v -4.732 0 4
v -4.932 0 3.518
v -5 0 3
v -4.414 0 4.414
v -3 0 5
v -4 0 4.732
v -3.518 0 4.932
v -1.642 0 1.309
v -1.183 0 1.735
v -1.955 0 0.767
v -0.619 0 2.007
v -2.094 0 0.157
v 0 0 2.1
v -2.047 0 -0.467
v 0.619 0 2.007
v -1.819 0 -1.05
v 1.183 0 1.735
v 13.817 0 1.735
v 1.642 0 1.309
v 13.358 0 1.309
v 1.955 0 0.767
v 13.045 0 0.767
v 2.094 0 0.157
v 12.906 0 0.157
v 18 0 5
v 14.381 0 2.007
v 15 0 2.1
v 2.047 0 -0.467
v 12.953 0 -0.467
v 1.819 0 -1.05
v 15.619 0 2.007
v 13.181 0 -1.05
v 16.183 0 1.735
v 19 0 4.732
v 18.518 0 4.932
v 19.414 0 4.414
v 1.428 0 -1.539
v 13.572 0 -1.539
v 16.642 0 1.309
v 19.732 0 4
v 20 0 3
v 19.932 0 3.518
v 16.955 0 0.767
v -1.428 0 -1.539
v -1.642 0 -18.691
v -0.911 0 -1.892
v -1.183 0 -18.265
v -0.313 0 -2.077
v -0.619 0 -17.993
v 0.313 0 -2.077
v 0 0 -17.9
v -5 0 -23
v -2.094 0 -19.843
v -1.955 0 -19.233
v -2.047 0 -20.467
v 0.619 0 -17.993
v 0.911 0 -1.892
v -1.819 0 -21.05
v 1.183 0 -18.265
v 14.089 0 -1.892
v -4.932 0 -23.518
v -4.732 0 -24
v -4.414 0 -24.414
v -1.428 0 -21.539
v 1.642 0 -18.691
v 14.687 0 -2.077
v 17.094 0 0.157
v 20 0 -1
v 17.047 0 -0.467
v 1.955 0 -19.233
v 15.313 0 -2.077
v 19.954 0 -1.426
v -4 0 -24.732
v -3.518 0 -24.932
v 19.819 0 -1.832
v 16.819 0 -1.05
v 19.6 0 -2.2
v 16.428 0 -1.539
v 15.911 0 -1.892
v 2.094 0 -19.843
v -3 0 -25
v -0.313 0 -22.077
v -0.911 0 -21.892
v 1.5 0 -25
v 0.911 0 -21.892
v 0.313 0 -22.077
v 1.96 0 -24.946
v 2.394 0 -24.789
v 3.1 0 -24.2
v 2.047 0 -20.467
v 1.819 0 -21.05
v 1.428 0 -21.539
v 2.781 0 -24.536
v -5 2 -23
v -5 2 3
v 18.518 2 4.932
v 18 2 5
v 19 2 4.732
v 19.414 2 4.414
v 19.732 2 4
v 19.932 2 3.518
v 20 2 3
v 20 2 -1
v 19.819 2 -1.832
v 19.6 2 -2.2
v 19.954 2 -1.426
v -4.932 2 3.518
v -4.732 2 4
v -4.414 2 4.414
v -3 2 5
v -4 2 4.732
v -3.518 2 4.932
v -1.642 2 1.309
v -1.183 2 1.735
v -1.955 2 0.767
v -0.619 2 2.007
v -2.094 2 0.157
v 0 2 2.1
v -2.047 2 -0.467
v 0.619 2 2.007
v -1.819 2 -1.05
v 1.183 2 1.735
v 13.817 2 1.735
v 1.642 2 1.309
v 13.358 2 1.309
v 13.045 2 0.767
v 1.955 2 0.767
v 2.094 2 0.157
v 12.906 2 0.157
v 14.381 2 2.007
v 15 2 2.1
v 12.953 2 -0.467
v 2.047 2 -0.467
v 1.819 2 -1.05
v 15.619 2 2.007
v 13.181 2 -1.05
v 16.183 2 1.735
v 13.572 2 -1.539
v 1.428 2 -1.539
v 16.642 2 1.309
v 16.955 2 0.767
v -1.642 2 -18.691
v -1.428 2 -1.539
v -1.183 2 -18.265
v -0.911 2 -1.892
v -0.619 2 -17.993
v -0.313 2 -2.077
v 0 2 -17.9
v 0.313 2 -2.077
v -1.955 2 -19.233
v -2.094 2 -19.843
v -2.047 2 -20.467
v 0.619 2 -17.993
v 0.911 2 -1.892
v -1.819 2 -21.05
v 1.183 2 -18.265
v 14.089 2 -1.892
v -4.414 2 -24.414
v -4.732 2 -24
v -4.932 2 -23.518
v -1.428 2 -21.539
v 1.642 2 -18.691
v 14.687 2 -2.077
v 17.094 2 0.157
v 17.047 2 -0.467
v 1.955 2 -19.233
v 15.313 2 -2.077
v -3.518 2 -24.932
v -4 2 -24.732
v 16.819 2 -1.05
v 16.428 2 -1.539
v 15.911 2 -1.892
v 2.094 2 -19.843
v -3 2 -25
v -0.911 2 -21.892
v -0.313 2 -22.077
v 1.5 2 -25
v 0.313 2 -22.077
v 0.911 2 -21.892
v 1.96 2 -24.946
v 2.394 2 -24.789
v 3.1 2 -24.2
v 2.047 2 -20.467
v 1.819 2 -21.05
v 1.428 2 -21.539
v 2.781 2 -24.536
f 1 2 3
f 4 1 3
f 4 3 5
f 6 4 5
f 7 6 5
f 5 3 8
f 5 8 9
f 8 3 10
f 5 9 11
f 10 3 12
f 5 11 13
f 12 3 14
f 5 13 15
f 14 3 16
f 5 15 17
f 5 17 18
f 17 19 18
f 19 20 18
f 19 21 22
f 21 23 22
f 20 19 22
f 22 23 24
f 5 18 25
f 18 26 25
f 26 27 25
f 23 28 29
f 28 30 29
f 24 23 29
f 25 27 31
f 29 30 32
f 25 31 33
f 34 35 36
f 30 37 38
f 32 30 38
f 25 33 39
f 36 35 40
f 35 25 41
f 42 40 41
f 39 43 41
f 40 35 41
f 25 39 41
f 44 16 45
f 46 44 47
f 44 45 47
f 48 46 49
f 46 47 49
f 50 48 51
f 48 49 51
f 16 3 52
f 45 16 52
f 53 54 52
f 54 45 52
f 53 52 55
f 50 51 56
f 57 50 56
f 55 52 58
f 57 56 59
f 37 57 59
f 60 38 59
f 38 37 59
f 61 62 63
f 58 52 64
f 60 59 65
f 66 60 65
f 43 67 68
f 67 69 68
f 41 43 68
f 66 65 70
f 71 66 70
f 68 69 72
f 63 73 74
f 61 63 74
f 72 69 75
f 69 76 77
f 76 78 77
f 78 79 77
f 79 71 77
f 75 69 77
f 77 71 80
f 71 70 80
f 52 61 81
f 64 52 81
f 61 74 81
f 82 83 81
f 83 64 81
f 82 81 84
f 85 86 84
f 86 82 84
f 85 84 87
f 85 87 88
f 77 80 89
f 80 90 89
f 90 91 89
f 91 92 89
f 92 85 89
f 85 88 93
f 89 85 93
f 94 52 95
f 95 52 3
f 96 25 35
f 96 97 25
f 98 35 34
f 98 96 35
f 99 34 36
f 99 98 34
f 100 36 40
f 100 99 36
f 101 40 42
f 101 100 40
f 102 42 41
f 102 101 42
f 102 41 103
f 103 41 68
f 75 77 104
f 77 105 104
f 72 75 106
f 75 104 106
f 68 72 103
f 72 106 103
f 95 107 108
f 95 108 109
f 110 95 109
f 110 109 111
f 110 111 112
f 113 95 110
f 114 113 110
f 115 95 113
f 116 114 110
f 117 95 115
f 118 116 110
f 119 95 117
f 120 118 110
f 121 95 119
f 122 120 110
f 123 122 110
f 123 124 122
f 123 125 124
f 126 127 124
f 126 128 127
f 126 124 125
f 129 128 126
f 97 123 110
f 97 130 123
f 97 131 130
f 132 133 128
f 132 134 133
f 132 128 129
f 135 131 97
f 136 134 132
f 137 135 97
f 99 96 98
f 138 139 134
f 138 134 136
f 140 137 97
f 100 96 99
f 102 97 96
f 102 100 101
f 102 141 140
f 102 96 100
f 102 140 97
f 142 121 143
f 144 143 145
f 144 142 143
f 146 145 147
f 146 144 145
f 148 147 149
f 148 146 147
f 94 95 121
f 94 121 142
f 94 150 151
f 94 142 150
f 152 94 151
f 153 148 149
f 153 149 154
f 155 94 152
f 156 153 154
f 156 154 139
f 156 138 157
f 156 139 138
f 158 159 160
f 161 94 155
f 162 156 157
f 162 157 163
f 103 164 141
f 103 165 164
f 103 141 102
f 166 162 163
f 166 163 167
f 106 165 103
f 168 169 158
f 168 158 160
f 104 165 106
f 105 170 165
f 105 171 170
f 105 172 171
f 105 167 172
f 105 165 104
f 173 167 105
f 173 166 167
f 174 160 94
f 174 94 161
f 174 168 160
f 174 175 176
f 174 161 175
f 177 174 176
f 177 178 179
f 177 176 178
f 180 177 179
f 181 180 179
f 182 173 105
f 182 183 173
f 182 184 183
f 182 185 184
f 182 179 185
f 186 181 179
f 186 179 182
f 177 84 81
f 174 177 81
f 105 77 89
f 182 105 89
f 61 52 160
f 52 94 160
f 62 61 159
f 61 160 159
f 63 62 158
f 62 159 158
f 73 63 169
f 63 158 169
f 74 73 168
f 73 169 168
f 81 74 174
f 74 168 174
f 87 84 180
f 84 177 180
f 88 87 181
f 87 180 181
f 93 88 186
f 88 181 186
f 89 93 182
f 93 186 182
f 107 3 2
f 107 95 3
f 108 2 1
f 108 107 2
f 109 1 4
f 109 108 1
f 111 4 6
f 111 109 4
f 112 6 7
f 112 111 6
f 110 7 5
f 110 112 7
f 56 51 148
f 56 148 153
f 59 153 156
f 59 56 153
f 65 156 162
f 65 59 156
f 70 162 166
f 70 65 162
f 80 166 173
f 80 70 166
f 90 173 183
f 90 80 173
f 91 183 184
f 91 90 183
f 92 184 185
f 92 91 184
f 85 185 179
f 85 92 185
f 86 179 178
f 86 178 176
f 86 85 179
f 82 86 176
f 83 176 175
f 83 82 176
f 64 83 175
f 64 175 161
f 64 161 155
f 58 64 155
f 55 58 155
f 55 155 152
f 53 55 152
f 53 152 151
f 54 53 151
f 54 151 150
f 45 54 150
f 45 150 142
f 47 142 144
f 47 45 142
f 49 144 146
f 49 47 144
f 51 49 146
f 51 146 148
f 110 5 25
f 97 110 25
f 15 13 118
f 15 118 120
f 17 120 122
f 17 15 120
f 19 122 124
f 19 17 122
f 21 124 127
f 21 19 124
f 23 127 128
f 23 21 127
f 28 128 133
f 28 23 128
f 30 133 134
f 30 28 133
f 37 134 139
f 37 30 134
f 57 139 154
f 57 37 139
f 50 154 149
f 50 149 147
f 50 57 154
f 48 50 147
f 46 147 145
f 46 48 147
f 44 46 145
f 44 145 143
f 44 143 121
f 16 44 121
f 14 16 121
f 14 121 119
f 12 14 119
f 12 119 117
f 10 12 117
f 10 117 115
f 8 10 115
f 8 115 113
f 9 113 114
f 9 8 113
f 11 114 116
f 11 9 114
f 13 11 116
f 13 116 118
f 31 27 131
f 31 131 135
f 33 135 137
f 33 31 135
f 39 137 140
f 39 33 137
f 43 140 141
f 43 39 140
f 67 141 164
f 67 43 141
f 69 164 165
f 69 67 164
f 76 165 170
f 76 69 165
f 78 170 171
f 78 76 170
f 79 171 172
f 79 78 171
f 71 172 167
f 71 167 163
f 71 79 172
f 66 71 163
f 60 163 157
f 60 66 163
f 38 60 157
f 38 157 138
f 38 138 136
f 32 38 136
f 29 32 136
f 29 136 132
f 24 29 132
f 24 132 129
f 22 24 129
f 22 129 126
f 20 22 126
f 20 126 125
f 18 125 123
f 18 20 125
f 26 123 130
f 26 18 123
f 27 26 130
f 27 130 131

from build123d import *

# Parameters (mm, degrees)
SKETCH_1_R      = 2.1
EXTRUDE_1_DEPTH = 2
FILLET_1_R      = 2


with BuildPart() as part:
    # ｽｹｯﾁ1 → ﾎﾞｽ - 押し出し1 (new body)
    with BuildSketch(Plane(origin=(0, 0, 0), x_dir=(1, 0, 0), z_dir=(0, 1, 0))):
        Polygon((-5, 25), (-5, -5), (20, -5), (20, 1.666666667), (2.5, 25), align=None)
        with Locations(Location((0, 20, 0), (0, 0, 270))):
            Circle(SKETCH_1_R, mode=Mode.SUBTRACT)
        with Locations(Location((0, 0, 0), (0, 0, 270))):
            Circle(SKETCH_1_R, mode=Mode.SUBTRACT)
        with Locations(Location((15, 0, 0), (0, 0, 270))):
            Circle(SKETCH_1_R, mode=Mode.SUBTRACT)
    extrude(amount=EXTRUDE_1_DEPTH)

    # ﾌｨﾚｯﾄ1
    fillet_1_edges = [part.edges().sort_by_distance(p)[0] for p in [
        (-5, 1, -25),
        (2.5, 1, -25),
        (20, 1, -1.666666667),
        (20, 1, 5),
        (-5, 1, 5),
    ]]
    fillet(fillet_1_edges, radius=FILLET_1_R)


solid = part.part
